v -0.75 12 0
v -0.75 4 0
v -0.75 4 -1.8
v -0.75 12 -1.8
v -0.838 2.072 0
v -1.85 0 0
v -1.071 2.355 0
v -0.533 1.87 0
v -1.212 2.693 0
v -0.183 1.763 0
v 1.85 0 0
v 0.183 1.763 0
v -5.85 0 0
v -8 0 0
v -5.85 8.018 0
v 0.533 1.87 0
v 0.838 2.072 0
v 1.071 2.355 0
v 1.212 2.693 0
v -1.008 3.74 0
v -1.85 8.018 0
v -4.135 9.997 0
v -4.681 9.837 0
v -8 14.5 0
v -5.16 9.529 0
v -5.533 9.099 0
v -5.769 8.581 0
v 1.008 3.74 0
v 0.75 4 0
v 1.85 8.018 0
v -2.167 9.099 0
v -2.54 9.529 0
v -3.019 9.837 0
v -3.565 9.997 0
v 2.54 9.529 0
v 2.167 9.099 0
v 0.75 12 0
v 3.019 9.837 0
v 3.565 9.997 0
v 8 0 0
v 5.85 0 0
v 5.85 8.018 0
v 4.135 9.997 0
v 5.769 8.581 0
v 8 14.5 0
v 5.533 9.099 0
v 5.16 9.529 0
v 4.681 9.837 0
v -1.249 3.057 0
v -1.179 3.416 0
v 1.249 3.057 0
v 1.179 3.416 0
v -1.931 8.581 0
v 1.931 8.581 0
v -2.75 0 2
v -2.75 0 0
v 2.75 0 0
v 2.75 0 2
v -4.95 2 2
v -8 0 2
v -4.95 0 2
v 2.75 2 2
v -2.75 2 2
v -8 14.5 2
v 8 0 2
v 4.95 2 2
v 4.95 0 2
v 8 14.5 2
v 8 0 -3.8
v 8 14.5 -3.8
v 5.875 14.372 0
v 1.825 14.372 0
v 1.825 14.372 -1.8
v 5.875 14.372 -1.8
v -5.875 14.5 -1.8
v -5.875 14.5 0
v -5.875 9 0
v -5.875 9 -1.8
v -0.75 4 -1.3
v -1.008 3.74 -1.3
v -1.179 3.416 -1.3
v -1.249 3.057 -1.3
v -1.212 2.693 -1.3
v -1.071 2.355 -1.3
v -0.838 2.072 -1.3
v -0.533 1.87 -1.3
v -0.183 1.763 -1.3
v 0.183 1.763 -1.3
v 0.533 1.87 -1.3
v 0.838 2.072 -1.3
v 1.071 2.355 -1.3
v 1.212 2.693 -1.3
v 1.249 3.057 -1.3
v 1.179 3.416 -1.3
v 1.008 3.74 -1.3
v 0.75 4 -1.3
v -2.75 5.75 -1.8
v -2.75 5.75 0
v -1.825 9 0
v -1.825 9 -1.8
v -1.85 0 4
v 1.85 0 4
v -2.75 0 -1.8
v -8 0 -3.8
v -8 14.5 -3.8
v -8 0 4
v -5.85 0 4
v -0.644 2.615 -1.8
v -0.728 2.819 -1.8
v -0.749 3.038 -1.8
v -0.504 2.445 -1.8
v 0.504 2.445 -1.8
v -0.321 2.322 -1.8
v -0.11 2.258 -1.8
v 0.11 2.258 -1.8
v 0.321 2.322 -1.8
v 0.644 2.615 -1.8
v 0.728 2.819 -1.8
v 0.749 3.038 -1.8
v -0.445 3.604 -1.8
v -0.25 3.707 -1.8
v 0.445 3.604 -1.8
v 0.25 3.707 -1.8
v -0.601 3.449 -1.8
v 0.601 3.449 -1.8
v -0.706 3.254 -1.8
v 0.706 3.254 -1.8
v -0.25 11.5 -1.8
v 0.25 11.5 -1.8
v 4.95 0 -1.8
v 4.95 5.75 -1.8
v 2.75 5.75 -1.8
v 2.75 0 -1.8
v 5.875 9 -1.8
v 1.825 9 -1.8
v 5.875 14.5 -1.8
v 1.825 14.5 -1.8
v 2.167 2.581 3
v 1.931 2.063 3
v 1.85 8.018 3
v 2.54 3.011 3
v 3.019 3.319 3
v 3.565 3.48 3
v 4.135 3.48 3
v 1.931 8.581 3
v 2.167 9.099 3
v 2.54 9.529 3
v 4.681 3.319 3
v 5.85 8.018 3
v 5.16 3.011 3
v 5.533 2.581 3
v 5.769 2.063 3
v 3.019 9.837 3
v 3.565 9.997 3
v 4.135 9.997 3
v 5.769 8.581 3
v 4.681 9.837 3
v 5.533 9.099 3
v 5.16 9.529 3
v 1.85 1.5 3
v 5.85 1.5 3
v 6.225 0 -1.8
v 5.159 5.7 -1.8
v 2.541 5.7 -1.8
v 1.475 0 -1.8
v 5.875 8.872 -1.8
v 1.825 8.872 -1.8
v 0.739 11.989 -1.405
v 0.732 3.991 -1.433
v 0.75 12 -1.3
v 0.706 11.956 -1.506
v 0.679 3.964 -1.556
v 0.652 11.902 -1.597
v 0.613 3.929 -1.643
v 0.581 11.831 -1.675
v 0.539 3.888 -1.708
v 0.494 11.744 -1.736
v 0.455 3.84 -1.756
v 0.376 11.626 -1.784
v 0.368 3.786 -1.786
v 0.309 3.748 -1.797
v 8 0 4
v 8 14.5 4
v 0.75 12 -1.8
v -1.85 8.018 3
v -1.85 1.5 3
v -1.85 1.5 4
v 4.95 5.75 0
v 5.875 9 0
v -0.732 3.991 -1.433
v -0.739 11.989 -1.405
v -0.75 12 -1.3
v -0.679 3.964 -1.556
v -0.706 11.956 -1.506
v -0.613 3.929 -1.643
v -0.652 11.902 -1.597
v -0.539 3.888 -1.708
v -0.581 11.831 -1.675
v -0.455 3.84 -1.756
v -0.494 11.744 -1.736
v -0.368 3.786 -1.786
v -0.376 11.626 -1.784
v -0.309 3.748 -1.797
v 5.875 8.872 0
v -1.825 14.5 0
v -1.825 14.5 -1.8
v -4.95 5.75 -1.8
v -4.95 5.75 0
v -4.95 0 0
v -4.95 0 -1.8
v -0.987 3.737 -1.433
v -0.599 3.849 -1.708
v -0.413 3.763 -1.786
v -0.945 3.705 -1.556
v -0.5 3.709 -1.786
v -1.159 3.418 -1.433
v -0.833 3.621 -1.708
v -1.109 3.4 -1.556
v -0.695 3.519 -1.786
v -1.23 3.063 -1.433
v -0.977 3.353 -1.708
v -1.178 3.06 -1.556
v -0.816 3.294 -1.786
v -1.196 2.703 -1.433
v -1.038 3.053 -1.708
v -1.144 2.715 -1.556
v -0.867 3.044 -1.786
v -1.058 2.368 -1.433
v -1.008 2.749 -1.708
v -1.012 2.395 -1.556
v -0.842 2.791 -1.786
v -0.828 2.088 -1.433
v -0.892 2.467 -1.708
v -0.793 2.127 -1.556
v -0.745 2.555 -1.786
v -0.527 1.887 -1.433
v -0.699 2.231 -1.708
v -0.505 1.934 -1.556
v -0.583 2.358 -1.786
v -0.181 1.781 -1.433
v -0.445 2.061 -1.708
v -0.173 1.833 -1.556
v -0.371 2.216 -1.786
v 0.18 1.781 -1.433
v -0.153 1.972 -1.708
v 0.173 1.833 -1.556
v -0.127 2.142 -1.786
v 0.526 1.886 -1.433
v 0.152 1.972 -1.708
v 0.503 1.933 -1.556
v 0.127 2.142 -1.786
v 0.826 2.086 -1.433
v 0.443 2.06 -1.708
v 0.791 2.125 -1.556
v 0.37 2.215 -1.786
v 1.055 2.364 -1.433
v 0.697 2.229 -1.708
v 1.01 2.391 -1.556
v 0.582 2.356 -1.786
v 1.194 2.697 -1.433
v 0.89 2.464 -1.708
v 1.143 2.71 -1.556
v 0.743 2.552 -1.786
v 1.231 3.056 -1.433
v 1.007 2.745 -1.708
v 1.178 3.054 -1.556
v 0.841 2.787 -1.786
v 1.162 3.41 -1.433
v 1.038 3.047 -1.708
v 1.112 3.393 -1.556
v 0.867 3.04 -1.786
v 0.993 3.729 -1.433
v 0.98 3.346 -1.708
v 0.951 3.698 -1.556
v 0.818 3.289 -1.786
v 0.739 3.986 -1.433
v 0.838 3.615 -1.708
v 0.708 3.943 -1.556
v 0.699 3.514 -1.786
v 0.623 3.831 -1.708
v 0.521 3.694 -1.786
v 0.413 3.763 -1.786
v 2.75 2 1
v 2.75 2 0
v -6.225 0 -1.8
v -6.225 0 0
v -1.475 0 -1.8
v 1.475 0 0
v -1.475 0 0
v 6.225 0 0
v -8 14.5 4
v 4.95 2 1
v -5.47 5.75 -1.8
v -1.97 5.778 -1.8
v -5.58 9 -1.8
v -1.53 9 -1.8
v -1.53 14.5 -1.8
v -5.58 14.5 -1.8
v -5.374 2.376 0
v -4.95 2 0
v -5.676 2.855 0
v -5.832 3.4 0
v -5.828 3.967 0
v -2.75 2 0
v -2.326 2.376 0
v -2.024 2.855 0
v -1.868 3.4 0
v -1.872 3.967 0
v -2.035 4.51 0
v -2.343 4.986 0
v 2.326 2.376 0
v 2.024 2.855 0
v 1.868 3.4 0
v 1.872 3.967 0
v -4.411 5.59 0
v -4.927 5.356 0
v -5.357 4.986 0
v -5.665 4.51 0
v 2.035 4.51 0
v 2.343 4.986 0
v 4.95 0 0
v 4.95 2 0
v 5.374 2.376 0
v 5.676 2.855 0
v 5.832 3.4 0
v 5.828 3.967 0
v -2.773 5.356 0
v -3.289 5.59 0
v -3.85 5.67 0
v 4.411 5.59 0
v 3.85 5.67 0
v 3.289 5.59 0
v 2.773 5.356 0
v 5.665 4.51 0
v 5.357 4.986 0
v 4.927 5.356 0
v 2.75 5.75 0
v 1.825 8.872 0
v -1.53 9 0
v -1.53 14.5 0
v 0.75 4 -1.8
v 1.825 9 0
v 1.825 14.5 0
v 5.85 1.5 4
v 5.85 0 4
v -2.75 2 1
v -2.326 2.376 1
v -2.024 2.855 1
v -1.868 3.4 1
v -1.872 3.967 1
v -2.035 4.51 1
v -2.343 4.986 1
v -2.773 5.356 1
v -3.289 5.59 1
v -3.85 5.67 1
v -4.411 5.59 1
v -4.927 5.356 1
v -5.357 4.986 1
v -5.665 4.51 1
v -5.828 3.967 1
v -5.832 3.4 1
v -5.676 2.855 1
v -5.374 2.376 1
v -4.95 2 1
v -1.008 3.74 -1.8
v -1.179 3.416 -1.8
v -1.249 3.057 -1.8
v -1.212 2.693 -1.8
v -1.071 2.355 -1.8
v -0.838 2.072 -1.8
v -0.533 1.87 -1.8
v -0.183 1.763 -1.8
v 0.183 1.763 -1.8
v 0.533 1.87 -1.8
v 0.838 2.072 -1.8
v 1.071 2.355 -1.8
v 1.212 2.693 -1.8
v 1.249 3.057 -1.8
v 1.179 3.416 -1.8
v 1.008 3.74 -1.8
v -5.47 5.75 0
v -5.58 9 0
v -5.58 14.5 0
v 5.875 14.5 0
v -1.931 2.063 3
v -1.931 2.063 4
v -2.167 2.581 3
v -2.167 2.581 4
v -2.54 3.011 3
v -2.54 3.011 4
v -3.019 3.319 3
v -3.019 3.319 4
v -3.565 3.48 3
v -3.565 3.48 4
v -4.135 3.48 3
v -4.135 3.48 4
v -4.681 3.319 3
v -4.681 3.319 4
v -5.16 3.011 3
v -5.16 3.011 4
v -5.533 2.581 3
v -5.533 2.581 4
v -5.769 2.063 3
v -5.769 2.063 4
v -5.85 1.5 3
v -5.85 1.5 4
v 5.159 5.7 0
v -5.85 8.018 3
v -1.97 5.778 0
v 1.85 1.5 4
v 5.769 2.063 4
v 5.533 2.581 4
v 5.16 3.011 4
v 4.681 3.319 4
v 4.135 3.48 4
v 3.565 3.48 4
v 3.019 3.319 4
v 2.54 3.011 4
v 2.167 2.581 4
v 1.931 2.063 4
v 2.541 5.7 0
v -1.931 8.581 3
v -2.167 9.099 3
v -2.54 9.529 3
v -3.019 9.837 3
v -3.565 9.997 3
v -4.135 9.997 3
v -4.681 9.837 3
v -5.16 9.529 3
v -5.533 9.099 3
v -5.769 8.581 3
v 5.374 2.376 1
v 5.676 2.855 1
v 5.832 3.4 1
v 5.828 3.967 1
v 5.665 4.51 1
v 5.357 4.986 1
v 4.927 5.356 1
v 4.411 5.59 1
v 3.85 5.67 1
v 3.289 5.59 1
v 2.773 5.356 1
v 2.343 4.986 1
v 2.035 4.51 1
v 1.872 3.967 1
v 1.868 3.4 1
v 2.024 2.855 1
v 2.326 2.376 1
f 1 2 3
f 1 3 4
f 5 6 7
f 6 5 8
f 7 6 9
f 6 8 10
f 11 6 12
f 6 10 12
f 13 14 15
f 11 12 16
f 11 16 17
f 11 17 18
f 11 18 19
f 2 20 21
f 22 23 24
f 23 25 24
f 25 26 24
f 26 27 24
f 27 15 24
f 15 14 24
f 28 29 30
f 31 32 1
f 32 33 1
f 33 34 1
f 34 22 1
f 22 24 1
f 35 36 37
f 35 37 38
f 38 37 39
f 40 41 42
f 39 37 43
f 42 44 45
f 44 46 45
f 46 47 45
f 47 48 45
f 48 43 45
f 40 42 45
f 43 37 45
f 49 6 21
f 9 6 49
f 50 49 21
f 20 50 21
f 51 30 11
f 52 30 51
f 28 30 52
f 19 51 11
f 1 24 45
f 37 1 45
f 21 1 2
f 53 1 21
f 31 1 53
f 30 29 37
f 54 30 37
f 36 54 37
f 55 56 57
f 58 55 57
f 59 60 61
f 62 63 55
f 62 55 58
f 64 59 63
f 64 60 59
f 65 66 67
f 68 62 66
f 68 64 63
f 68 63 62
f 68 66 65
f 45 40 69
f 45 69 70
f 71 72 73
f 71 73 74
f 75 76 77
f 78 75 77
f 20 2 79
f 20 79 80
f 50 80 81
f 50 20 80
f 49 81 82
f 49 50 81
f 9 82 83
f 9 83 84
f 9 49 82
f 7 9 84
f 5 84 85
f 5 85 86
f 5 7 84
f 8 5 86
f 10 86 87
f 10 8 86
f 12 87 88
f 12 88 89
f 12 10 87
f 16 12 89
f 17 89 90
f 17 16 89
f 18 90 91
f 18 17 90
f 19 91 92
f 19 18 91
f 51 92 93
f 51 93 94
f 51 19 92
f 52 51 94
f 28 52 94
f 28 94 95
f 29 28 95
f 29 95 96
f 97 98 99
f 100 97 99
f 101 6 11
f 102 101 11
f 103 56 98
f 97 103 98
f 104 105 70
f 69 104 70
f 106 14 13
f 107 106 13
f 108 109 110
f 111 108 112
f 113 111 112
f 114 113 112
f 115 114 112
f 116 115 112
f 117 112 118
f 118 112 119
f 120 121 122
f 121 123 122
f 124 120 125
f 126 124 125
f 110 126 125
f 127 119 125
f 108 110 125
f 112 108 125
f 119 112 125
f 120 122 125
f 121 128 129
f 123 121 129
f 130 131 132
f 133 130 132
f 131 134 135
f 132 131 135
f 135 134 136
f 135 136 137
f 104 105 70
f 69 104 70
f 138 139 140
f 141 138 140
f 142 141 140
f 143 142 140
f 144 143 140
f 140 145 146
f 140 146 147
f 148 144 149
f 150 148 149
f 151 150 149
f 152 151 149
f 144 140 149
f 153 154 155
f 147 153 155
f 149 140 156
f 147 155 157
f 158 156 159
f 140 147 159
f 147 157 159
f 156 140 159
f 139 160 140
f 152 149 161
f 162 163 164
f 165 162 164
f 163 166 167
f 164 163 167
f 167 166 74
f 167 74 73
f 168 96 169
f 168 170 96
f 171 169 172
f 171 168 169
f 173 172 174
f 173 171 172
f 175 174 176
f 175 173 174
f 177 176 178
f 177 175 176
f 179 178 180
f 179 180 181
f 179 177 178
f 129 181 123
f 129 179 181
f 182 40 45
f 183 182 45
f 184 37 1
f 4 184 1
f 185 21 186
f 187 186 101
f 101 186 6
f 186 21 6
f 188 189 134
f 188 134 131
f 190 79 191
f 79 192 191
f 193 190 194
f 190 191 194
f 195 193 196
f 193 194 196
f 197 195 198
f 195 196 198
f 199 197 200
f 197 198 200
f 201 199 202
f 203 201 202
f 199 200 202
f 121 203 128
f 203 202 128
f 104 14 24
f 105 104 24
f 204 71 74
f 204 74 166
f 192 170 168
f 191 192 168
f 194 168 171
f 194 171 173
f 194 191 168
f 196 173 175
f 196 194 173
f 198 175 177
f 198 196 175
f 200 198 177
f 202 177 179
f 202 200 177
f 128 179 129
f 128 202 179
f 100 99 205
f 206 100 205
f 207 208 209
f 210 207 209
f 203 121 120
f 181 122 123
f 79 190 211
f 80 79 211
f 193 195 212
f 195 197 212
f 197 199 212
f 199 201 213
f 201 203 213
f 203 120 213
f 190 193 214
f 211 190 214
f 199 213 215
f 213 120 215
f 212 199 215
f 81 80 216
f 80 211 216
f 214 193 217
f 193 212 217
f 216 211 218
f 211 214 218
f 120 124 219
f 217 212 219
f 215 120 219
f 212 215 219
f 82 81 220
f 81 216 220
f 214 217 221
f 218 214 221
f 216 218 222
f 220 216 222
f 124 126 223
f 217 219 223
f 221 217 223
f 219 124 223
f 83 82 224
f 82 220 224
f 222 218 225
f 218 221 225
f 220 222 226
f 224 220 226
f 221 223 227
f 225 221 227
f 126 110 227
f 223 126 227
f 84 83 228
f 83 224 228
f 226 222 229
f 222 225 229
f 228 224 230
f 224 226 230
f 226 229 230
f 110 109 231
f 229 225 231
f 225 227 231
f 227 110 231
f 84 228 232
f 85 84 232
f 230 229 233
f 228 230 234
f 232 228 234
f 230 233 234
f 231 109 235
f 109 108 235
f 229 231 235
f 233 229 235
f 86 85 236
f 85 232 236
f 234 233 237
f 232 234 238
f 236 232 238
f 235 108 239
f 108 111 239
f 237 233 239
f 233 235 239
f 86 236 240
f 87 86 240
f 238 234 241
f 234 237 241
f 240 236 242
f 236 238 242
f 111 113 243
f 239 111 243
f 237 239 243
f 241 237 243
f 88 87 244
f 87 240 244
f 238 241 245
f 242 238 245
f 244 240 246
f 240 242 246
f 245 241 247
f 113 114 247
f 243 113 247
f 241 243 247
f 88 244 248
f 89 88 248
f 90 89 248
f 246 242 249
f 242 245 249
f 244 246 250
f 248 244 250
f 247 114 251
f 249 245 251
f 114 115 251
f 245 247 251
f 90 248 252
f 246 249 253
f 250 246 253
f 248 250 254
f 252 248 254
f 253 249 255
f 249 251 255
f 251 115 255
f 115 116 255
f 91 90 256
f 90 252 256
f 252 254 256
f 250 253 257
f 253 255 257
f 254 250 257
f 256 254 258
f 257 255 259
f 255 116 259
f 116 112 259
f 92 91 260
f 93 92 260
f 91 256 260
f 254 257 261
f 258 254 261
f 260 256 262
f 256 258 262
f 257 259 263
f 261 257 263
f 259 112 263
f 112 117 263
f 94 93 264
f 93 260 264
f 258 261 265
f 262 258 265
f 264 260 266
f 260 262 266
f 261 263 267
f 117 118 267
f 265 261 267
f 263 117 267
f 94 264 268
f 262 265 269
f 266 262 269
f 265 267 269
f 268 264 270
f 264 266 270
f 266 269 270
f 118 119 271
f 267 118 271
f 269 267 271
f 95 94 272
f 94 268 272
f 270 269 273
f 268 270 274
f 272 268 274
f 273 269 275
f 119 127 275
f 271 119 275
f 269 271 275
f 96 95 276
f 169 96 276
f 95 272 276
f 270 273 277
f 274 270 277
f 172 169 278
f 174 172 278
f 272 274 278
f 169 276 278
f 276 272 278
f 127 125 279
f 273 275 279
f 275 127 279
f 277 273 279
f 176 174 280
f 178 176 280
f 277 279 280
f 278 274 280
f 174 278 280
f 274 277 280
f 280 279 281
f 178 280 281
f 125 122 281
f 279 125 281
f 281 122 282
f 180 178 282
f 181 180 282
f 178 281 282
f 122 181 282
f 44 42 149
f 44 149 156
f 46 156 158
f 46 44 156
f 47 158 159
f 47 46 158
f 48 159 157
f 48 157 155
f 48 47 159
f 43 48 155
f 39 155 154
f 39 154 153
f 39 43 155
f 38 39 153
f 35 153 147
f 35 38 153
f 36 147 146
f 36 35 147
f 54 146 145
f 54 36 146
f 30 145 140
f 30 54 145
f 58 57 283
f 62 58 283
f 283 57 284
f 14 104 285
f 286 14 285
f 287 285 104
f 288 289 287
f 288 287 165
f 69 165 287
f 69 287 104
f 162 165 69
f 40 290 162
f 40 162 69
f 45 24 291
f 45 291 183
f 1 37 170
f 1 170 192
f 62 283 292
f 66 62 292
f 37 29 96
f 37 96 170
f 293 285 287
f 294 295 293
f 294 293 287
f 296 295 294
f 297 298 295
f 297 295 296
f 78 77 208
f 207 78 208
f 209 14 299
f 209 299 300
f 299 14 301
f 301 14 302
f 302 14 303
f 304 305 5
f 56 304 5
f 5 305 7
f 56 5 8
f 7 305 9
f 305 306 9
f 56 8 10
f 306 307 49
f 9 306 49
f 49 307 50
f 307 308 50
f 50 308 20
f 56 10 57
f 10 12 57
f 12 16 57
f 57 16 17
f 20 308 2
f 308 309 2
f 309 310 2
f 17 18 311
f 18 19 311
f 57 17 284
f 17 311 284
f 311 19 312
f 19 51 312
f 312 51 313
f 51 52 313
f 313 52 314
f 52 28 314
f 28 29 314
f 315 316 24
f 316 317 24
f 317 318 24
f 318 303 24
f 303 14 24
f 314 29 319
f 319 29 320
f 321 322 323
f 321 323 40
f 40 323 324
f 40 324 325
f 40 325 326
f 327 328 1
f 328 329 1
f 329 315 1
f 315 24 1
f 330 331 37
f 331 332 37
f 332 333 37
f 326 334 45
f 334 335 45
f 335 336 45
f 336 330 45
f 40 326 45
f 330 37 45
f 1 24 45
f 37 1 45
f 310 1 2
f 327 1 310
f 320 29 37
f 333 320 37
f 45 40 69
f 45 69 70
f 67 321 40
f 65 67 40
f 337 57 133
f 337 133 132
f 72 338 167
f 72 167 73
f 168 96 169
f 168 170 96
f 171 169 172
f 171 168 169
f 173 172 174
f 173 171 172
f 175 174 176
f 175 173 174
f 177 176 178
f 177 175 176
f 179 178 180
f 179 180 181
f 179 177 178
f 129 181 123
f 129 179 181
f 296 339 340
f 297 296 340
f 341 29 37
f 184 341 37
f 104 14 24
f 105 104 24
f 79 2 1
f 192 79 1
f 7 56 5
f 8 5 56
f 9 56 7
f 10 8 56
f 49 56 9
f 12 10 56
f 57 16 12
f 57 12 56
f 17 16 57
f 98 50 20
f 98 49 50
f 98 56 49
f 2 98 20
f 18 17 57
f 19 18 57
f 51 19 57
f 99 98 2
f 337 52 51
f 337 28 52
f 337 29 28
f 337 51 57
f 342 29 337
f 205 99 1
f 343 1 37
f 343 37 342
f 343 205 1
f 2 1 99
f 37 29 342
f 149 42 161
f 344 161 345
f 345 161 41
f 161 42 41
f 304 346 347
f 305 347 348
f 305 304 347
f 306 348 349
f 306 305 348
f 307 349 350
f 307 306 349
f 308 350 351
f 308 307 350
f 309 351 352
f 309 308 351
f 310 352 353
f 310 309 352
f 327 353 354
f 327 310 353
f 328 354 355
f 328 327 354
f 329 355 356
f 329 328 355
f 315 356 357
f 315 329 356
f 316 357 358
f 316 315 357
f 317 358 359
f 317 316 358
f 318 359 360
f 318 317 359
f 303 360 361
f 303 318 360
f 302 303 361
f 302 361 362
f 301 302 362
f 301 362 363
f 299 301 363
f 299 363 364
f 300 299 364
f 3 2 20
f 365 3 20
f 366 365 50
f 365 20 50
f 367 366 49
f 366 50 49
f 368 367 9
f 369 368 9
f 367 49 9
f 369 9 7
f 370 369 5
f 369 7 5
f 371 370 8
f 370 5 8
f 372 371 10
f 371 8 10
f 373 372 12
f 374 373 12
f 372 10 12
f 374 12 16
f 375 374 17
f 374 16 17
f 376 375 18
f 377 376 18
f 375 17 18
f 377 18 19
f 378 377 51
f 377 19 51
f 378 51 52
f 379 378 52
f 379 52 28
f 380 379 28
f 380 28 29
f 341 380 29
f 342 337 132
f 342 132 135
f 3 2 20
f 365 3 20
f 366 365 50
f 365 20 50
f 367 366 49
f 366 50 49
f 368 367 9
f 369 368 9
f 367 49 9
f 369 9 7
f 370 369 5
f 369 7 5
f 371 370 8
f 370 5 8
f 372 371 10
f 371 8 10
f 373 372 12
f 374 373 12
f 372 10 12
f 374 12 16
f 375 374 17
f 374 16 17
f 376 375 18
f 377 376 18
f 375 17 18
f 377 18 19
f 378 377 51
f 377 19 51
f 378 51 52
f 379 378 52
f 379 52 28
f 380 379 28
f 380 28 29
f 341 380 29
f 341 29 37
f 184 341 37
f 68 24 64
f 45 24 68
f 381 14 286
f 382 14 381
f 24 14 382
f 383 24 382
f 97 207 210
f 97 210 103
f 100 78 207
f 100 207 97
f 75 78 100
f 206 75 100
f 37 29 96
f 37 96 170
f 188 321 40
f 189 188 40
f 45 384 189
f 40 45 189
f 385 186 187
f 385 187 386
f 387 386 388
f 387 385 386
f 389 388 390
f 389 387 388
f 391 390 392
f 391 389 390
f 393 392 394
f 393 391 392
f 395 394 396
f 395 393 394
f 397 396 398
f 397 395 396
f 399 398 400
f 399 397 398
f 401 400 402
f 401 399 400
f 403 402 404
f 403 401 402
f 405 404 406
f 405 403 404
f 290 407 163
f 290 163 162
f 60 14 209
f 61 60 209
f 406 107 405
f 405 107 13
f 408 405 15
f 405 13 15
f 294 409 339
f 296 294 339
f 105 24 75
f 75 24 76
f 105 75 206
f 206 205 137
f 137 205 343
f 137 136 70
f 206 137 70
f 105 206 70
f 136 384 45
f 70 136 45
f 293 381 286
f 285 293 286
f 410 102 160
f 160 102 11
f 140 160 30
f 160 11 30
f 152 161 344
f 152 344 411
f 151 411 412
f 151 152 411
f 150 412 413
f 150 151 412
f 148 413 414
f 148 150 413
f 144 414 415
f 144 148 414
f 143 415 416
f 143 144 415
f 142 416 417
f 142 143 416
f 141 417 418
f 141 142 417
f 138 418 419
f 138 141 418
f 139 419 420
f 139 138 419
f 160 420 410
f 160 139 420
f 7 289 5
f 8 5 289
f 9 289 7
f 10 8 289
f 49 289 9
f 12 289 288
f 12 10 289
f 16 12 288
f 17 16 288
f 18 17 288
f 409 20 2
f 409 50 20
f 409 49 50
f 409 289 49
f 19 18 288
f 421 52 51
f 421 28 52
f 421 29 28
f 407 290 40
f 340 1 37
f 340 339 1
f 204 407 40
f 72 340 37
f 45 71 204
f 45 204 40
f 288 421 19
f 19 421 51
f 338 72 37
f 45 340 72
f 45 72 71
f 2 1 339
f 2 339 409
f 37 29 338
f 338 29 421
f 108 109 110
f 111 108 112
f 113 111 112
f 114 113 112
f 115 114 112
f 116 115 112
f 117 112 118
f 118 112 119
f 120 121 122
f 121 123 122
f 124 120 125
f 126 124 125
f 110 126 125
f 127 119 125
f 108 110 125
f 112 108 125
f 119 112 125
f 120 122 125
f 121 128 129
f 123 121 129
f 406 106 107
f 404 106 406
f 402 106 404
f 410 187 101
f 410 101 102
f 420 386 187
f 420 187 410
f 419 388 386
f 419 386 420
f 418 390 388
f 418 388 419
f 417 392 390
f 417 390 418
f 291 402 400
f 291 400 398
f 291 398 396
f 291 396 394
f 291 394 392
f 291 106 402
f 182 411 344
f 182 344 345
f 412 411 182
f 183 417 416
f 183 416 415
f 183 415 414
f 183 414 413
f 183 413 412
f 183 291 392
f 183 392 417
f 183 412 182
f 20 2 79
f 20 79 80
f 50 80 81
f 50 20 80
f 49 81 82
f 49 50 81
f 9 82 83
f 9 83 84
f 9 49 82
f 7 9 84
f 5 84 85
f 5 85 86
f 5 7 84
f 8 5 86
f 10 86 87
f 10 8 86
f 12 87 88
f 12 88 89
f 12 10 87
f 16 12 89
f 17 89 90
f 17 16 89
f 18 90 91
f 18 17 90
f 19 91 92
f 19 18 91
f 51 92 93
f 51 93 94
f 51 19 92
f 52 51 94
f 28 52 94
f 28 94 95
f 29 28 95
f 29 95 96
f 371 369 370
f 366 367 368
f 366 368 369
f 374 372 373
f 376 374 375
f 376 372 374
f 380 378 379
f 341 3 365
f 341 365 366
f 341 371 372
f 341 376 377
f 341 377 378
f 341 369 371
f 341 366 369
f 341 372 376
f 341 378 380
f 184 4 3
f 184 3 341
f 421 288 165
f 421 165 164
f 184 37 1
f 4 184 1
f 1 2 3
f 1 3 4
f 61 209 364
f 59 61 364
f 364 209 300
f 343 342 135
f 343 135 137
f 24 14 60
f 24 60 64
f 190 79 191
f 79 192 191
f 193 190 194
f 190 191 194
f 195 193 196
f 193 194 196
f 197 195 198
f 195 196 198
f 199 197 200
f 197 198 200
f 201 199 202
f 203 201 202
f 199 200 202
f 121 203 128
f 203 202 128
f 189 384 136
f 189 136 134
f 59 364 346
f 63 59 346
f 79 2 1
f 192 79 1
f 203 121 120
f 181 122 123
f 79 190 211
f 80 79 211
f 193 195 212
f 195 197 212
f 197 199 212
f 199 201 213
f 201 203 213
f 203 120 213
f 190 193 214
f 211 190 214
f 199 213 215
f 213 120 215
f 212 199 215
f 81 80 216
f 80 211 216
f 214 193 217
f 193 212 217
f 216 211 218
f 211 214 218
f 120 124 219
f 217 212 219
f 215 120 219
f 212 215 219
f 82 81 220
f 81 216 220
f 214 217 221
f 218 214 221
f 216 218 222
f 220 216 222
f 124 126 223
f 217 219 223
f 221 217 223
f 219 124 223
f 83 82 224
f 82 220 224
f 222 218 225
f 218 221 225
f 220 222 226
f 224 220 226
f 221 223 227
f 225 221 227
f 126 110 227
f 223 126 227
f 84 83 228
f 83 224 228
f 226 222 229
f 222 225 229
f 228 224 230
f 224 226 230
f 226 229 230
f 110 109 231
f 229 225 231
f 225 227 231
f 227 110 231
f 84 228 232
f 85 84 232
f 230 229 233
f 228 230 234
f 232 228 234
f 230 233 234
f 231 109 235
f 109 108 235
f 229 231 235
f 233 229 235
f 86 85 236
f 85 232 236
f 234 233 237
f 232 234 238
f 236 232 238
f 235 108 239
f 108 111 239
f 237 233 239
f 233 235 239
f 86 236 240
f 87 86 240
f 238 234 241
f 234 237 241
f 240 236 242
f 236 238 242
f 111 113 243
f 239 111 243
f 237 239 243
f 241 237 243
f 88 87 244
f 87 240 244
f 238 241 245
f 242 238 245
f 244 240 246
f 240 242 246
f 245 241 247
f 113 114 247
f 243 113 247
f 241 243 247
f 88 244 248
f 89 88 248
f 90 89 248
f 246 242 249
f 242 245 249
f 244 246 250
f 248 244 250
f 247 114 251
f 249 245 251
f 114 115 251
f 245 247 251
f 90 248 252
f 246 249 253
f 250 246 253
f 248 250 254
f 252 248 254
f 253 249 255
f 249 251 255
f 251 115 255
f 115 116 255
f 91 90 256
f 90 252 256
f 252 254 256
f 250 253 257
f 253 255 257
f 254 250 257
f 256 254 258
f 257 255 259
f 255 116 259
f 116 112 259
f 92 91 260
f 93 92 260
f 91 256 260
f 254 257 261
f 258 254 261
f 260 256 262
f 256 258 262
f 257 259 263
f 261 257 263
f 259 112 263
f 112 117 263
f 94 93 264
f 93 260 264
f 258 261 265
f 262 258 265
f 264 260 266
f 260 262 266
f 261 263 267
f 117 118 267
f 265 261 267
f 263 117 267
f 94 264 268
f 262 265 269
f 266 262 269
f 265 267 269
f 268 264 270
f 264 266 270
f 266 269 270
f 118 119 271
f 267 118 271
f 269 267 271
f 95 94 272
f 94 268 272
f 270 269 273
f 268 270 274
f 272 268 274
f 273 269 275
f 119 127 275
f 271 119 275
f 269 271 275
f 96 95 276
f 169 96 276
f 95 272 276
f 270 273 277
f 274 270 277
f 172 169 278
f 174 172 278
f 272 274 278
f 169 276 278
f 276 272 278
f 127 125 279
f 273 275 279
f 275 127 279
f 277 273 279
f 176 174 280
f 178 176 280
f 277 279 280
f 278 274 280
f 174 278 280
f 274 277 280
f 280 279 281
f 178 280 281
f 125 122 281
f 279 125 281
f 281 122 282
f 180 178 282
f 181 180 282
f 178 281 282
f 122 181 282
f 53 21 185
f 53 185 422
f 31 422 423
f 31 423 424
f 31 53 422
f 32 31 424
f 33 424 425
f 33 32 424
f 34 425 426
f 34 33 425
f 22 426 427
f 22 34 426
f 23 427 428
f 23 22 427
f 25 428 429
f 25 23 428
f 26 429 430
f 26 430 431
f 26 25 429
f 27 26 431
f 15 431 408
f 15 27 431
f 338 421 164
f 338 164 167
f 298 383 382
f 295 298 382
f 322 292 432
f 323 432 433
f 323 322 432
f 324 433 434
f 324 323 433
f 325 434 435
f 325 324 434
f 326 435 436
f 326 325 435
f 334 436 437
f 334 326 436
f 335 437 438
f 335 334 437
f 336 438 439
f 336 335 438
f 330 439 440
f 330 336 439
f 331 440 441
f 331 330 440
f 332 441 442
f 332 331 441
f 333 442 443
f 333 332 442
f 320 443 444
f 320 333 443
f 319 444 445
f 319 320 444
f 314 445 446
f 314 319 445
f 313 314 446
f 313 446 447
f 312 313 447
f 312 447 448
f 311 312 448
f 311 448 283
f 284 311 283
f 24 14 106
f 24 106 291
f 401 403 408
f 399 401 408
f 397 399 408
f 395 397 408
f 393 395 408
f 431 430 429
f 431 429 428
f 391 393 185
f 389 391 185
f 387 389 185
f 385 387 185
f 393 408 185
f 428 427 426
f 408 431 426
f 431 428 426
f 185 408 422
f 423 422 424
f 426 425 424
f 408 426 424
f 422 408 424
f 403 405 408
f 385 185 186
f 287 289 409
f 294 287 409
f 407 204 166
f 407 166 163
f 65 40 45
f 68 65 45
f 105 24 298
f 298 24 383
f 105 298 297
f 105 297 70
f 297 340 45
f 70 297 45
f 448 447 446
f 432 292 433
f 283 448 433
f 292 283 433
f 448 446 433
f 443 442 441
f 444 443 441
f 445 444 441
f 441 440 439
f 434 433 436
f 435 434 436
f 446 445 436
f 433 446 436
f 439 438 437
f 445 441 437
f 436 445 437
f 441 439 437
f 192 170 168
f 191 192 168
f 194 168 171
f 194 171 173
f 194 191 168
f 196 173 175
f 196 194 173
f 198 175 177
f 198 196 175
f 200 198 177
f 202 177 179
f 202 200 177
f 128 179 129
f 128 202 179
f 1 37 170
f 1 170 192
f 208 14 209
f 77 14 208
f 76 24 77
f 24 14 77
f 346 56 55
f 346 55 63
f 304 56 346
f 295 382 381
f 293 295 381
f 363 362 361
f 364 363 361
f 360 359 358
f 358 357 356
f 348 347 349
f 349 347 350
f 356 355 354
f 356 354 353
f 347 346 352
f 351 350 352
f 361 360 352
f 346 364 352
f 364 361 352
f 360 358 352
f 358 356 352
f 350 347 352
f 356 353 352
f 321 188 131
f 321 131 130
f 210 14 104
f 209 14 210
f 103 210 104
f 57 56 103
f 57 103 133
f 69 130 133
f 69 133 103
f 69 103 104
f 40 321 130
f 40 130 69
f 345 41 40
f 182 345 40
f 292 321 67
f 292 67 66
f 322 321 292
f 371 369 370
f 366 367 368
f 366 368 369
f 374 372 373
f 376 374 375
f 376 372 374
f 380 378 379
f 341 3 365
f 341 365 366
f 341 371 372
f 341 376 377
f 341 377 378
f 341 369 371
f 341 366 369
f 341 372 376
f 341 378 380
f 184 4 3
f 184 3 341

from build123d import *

# Parameters (mm, degrees)
SKETCH_W             = 16
SKETCH_H             = 14.5
PAD_DEPTH            = 3.8
POCKET_DEPTH         = 1.8
SKETCH002_W          = 16
SKETCH002_H          = 14.5
PAD001_DEPTH         = 2
PAD002_DEPTH         = 1.8
FILLET_R             = 0.5
SKETCH004_W          = 2.2
SKETCH004_H          = 2
POCKET001_DEPTH      = 100
POCKET001_DEPTH_BACK = -100
SKETCH005_R          = 2
POCKET002_DEPTH      = 1
SKETCH006_W          = 16
SKETCH006_H          = 14.5
PAD003_DEPTH         = 3.8
POCKET003_DEPTH      = 1.8
SKETCH008_W          = 16
SKETCH008_H          = 14.5
PAD004_DEPTH         = 4
PAD005_DEPTH         = 1.8
FILLET001_R          = 0.5
POCKET004_DEPTH      = 100
POCKET004_DEPTH_BACK = -100
POCKET005_DEPTH      = 3


with BuildPart() as bottom_small_gauge:
    # Sketch → Pad (new body)
    with BuildSketch(Plane.XY):
        with Locations((0, 7.25)):
            Rectangle(SKETCH_W, SKETCH_H)
    extrude(amount=-PAD_DEPTH)

    # Sketch001 → Pocket (cut)
    with BuildSketch(Plane.XY):
        Polygon((-5.875, 14.5), (-5.875, 9), (-4.95, 5.75), (-4.95, 0), (-2.75, 0), (-2.75, 5.75), (-1.825, 9), (-1.825, 14.5), align=None)
        Polygon((2.75, 0), (2.75, 5.75), (1.825, 9), (1.825, 14.5), (5.875, 14.5), (5.875, 9), (4.95, 5.75), (4.95, 0), align=None)
        with BuildLine():
            ThreePointArc((-0.75, 4), (0, 1.75), (0.75, 4))
            Line((0.75, 4), (0.75, 12))
            Line((0.75, 12), (-0.75, 12))
            Line((-0.75, 4), (-0.75, 12))
        make_face()
    extrude(amount=-POCKET_DEPTH, mode=Mode.SUBTRACT)


with BuildPart() as top_small_gauge:
    # Sketch002 → Pad001 (new body)
    with BuildSketch(Plane.XY):
        with Locations((0, 7.25)):
            Rectangle(SKETCH002_W, SKETCH002_H)
    extrude(amount=PAD001_DEPTH)

    # Sketch003 → Pad002 (join)
    with BuildSketch(Plane.XY):
        with BuildLine():
            ThreePointArc((-0.75, 4), (0, 1.75), (0.75, 4))
            Line((0.75, 4), (0.75, 12))
            Line((0.75, 12), (-0.75, 12))
            Line((-0.75, 4), (-0.75, 12))
        make_face()
    extrude(amount=-PAD002_DEPTH)

    # Fillet
    fillet_edges = [top_small_gauge.edges().sort_by_distance(p)[0] for p in [
        (0, 1.75, -1.8),
        (0.75, 8, -1.8),
        (0, 12, -1.8),
        (-0.75, 8, -1.8),
    ]]
    fillet(fillet_edges, radius=FILLET_R)

    # Sketch004 → Pocket001 (cut, two sides)
    with BuildSketch(Plane.XY) as pocket001_sk:
        with Locations((-3.85, 1)):
            Rectangle(SKETCH004_W, SKETCH004_H)
        with Locations((3.85, 1)):
            Rectangle(SKETCH004_W, SKETCH004_H)
    extrude(amount=-POCKET001_DEPTH, mode=Mode.SUBTRACT)
    extrude(pocket001_sk.sketch, amount=-POCKET001_DEPTH_BACK, mode=Mode.SUBTRACT)

    # Sketch005 → Pocket002 (cut)
    with BuildSketch(Plane.XY):
        with Locations((-3.85, 3.670329)):
            Circle(SKETCH005_R)
        with Locations((3.85, 3.670329)):
            Circle(SKETCH005_R)
    extrude(amount=POCKET002_DEPTH, mode=Mode.SUBTRACT)


with BuildPart() as bottom_large_gauge:
    # Sketch006 → Pad003 (new body)
    with BuildSketch(Plane.XY):
        with Locations((0, 7.25)):
            Rectangle(SKETCH006_W, SKETCH006_H)
    extrude(amount=-PAD003_DEPTH)

    # Sketch007 → Pocket003 (cut)
    with BuildSketch(Plane.XY):
        Polygon((-5.579626, 14.5), (-5.579626, 9), (-5.470217, 5.75), (-6.225, 0), (-1.475, 0), (-1.970217, 5.778145), (-1.529626, 9), (-1.529626, 14.5), align=None)
        Polygon((1.475, 0), (2.541261, 5.700464), (1.825132, 8.872471), (1.825132, 14.372471), (5.875132, 14.372471), (5.875132, 8.872471), (5.158883, 5.700491), (6.225, 0), align=None)
        with BuildLine():
            ThreePointArc((-0.75, 4), (0, 1.75), (0.75, 4))
            Line((0.75, 4), (0.75, 12))
            Line((0.75, 12), (-0.75, 12))
            Line((-0.75, 4), (-0.75, 12))
        make_face()
    extrude(amount=-POCKET003_DEPTH, mode=Mode.SUBTRACT)


with BuildPart() as top_large_gauge:
    # Sketch008 → Pad004 (new body)
    with BuildSketch(Plane.XY):
        with Locations((0, 7.25)):
            Rectangle(SKETCH008_W, SKETCH008_H)
    extrude(amount=PAD004_DEPTH)

    # Sketch009 → Pad005 (join)
    with BuildSketch(Plane.XY):
        with BuildLine():
            ThreePointArc((-0.75, 4), (0, 1.75), (0.75, 4))
            Line((0.75, 4), (0.75, 12))
            Line((0.75, 12), (-0.75, 12))
            Line((-0.75, 4), (-0.75, 12))
        make_face()
    extrude(amount=-PAD005_DEPTH)

    # Fillet001
    fillet001_edges = [top_large_gauge.edges().sort_by_distance(p)[0] for p in [
        (0, 1.75, -1.8),
        (0.75, 8, -1.8),
        (0, 12, -1.8),
        (-0.75, 8, -1.8),
    ]]
    fillet(fillet001_edges, radius=FILLET001_R)

    # Sketch010 → Pocket004 (cut, two sides)
    with BuildSketch(Plane.XY) as pocket004_sk:
        with BuildLine():
            ThreePointArc((-1.85, 1.5), (-3.85, 3.5), (-5.85, 1.5))
            Line((-5.85, 1.5), (-5.85, -3.281396))
            Line((-5.85, -3.281396), (-1.85, -3.281396))
            Line((-1.85, 1.5), (-1.85, -3.281396))
        make_face()
        with BuildLine():
            ThreePointArc((5.85, 1.5), (3.85, 3.5), (1.85, 1.5))
            Line((1.85, 1.5), (1.85, -3.281396))
            Line((1.85, -3.281396), (5.85, -3.281396))
            Line((5.85, 1.5), (5.85, -3.281396))
        make_face()
    extrude(amount=-POCKET004_DEPTH, mode=Mode.SUBTRACT)
    extrude(pocket004_sk.sketch, amount=-POCKET004_DEPTH_BACK, mode=Mode.SUBTRACT)

    # Sketch011 → Pocket005 (cut)
    with BuildSketch(Plane.XY):
        with BuildLine():
            ThreePointArc((-5.85, -0.720417), (-3.85, -2.720417), (-1.85, -0.720417))
            Line((-1.85, -0.720417), (-1.85, 8.017636))
            ThreePointArc((-1.85, 8.017636), (-3.85, 10.017636), (-5.85, 8.017636))
            Line((-5.85, -0.720417), (-5.85, 8.017636))
        make_face()
        with BuildLine():
            ThreePointArc((1.85, -0.720417), (3.85, -2.720417), (5.85, -0.720417))
            Line((5.85, -0.720417), (5.85, 8.017636))
            ThreePointArc((5.85, 8.017636), (3.85, 10.017636), (1.85, 8.017635))
            Line((1.85, -0.720417), (1.85, 8.017635))
        make_face()
    extrude(amount=POCKET005_DEPTH, mode=Mode.SUBTRACT)


solid = Compound([bottom_small_gauge.part, top_small_gauge.part, bottom_large_gauge.part, top_large_gauge.part])
